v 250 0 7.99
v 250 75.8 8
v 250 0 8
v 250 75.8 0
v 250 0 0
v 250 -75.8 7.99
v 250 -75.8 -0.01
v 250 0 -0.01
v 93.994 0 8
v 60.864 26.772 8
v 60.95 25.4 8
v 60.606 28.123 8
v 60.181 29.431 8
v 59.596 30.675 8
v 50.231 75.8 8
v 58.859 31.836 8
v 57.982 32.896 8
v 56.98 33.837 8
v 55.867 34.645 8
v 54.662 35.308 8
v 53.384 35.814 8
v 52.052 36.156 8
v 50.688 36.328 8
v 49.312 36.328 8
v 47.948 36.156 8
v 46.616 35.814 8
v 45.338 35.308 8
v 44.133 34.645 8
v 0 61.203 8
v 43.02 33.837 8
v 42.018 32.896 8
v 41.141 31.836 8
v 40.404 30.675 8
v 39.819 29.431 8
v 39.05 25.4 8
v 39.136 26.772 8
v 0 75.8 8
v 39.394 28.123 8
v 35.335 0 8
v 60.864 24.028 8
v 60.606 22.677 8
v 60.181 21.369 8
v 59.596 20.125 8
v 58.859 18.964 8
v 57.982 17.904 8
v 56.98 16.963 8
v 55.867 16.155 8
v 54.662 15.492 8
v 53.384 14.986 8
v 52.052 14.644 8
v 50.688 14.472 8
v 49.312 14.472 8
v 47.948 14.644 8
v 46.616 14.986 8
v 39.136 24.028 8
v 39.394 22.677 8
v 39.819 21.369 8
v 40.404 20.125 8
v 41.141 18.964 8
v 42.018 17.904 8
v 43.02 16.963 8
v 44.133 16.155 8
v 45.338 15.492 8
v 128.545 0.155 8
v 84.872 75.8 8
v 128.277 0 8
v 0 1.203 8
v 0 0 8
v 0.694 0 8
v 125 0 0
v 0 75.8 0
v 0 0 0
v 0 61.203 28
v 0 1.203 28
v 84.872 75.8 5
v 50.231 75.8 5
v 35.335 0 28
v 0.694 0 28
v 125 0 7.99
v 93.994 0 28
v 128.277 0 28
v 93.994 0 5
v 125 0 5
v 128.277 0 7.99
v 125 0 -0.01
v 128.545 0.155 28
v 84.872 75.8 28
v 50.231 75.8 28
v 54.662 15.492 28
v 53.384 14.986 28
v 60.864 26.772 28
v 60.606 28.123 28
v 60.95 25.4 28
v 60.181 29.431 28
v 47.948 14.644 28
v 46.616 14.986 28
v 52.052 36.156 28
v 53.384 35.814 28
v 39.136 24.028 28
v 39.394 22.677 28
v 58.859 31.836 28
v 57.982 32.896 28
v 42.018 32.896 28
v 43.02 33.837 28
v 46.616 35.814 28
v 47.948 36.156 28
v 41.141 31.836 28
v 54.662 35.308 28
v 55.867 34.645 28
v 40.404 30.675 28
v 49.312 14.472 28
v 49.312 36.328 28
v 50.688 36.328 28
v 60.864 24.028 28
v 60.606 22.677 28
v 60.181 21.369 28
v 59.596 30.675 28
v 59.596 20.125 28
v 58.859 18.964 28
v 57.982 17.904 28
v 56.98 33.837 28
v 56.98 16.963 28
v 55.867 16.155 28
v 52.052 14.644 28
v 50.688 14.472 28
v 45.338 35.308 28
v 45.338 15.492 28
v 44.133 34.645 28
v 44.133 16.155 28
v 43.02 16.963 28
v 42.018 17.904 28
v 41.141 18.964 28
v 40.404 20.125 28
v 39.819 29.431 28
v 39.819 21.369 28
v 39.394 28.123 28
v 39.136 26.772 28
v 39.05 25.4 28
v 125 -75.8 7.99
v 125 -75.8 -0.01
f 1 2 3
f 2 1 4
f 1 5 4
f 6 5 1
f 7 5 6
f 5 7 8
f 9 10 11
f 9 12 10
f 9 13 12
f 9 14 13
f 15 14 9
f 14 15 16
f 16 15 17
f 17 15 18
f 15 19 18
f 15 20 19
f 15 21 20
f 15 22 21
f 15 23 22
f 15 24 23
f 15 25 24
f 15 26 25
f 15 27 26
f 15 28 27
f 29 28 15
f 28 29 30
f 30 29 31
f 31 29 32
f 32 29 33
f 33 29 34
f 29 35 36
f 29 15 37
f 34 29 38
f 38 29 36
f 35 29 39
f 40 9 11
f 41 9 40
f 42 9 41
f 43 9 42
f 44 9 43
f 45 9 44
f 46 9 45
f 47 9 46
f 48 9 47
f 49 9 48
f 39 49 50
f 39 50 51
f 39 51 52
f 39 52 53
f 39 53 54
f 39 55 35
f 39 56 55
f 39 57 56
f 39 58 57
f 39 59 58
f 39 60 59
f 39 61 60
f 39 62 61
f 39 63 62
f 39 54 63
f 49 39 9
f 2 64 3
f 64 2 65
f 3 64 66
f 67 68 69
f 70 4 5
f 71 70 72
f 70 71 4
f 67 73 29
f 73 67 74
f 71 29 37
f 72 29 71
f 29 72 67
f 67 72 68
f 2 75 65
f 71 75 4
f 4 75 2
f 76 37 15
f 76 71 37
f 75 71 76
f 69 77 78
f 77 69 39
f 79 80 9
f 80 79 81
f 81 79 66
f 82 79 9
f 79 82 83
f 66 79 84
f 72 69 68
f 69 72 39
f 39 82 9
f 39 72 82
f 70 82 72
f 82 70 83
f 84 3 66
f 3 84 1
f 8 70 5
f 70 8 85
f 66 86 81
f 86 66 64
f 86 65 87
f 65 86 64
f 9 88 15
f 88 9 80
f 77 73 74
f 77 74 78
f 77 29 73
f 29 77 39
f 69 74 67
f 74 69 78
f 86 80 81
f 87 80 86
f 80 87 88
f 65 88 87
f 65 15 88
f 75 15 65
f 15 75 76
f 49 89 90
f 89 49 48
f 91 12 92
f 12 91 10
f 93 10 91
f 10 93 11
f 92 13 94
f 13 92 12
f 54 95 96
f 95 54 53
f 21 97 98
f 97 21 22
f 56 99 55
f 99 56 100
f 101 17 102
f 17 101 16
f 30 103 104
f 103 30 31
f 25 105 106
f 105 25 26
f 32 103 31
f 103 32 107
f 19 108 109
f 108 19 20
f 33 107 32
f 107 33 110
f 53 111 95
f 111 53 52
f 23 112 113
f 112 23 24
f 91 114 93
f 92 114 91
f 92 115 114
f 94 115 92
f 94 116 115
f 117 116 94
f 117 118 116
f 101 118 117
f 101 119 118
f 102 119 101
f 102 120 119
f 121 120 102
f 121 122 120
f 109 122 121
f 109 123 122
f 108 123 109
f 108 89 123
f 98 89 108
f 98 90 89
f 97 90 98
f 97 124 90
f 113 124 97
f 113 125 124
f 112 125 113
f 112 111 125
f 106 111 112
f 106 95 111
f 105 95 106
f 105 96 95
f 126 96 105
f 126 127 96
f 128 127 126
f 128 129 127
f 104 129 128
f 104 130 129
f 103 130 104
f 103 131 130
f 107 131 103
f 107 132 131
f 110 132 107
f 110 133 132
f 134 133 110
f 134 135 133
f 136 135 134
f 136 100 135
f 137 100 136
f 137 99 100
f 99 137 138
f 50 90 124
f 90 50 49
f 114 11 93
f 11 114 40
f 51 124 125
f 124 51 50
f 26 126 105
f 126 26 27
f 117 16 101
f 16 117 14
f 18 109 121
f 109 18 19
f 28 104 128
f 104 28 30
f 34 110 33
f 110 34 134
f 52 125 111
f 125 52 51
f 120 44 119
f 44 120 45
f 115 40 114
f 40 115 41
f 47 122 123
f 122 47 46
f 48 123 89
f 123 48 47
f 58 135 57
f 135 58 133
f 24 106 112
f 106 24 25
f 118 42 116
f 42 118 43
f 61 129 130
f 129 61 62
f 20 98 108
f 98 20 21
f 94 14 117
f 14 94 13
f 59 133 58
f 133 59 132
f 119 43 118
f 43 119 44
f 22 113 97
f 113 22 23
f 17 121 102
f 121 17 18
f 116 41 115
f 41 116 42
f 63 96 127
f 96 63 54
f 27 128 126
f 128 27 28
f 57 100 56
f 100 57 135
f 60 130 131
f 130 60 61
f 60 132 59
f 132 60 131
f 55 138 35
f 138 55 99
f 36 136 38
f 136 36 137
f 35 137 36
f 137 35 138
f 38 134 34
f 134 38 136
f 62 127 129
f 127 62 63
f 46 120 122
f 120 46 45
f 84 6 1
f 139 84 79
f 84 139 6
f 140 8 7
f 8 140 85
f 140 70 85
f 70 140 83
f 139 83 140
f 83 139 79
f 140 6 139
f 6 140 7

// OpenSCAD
// Hexagon Nut Table Saw Jig
// Parameters for the jig

// Face to face diameter of hexagon
outer_diameter = 50.8; // 2 inches = 50.8mm
// Diameter of the center hole
inner_hole_diameter = 21.9; // 7/8 inches = 22.225mm, minus 0.3mm = 21.925mm, rounded to 21.9mm 

// Thickness of the base plate
jig_thickness = 8; 
// Height of the dowel pin
dowel_height = 20; 

// for removable fence
recess_depth = 3;


// Calculated dimensions
jig_width = outer_diameter + 25; // Width of the jig base
jig_length = 250; // Length of the jig base
dowel_offset_from_top = 50; // 3 inches in mm
dowel_offset_from_left = outer_diameter / 2; // Center of hexagon from left edge

poop = 0.01;

module hexagon_jig() {

    
    // Angled fence for hexagon cutting
    // The fence is positioned to guide the workpiece at the correct angle
    fence_thickness = 30;
    fence_length = 200;
    corner_to_corner = outer_diameter * 1.1547; // cos(30°) = 0.866, so 1/cos(30°) = 1.1547


    difference() {
        // Main base plate
        cube([jig_length, jig_width, jig_thickness]);
        
        // Dowel hole
        //translate([dowel_offset_from_top, dowel_offset_from_left, 0]) {
        //    cylinder(h = jig_thickness, d = inner_hole_diameter, $fn = 50);
        //}


        // create recess for the rest of the hexagon
        /*
        translate([dowel_offset_from_top, dowel_offset_from_left, jig_thickness-3])
            rotate([0, 0, 90])
                // now translate at a -120 degree angle by corner_to_corner/2
                translate([0,corner_to_corner/2, 0])
                    rotate([0, 0, -30])
                        cube([jig_width, fence_thickness, 3+poop]);
        */

        // create recess for second fence
        translate([dowel_offset_from_top, dowel_offset_from_left, jig_thickness-recess_depth])
            rotate([0, 0, 60])
                // now translate at a -120 degree angle by corner_to_corner/2
                translate([corner_to_corner/2, 0,0])
                    rotate([0, 0, -120])
                        translate([-jig_width, 0, 0])
                            cube([jig_width*2, fence_thickness, recess_depth+poop]);

    }


    
    // Dowel pin
    translate([dowel_offset_from_top, dowel_offset_from_left, jig_thickness]) {
        cylinder(h = dowel_height, d = inner_hole_diameter, $fn = 50);
    }
    
    // hexagon face length
    face_length = outer_diameter * 1.1547; // cos(30°) = 0.866, so 1/cos(30°) = 1.1547

    
    // Position fence by rotating 120° and translating from dowel center
    // to the corner-to-corner distance at -120° angle
    
    
    
    difference(){
        union(){
            translate([dowel_offset_from_top, dowel_offset_from_left, 0])
                rotate([0, 0, -120])
                    // now translate at a -120 degree angle by corner_to_corner/2
                    translate([corner_to_corner/2, 0,0])
                        rotate([0, 0, -120])
                            cube([jig_width*2, fence_thickness, dowel_height+jig_thickness]);

            //second fence
            translate([dowel_offset_from_top, dowel_offset_from_left, jig_thickness-recess_depth])
                rotate([0, 0, 60])
                    // now translate at a -120 degree angle by corner_to_corner/2
                    translate([corner_to_corner/2, 0,0])
                        rotate([0, 0, -120])
                            translate([-jig_width, 0, 0])
                                cube([jig_width*2, fence_thickness, dowel_height+recess_depth]);
            
        }
        

        // crop off stuff overhanging the jig
        translate([-poop,-jig_width*2,-poop])
            cube([jig_length+poop*2, jig_width*2, 100]);
        translate([-poop,jig_width,-poop])
            cube([jig_length+poop*2, jig_width*2, 100]);
        // crop off +x and -x sides
        translate([-jig_width,-poop,-poop])  
            cube([jig_width, jig_width*3 + poop*2, 100]);

        
    }

    // expand the platform for safety
    translate([jig_length/2 ,-jig_width,-poop])
        cube([jig_length/2, jig_width, jig_thickness]);

}
// Render the jig
hexagon_jig();
